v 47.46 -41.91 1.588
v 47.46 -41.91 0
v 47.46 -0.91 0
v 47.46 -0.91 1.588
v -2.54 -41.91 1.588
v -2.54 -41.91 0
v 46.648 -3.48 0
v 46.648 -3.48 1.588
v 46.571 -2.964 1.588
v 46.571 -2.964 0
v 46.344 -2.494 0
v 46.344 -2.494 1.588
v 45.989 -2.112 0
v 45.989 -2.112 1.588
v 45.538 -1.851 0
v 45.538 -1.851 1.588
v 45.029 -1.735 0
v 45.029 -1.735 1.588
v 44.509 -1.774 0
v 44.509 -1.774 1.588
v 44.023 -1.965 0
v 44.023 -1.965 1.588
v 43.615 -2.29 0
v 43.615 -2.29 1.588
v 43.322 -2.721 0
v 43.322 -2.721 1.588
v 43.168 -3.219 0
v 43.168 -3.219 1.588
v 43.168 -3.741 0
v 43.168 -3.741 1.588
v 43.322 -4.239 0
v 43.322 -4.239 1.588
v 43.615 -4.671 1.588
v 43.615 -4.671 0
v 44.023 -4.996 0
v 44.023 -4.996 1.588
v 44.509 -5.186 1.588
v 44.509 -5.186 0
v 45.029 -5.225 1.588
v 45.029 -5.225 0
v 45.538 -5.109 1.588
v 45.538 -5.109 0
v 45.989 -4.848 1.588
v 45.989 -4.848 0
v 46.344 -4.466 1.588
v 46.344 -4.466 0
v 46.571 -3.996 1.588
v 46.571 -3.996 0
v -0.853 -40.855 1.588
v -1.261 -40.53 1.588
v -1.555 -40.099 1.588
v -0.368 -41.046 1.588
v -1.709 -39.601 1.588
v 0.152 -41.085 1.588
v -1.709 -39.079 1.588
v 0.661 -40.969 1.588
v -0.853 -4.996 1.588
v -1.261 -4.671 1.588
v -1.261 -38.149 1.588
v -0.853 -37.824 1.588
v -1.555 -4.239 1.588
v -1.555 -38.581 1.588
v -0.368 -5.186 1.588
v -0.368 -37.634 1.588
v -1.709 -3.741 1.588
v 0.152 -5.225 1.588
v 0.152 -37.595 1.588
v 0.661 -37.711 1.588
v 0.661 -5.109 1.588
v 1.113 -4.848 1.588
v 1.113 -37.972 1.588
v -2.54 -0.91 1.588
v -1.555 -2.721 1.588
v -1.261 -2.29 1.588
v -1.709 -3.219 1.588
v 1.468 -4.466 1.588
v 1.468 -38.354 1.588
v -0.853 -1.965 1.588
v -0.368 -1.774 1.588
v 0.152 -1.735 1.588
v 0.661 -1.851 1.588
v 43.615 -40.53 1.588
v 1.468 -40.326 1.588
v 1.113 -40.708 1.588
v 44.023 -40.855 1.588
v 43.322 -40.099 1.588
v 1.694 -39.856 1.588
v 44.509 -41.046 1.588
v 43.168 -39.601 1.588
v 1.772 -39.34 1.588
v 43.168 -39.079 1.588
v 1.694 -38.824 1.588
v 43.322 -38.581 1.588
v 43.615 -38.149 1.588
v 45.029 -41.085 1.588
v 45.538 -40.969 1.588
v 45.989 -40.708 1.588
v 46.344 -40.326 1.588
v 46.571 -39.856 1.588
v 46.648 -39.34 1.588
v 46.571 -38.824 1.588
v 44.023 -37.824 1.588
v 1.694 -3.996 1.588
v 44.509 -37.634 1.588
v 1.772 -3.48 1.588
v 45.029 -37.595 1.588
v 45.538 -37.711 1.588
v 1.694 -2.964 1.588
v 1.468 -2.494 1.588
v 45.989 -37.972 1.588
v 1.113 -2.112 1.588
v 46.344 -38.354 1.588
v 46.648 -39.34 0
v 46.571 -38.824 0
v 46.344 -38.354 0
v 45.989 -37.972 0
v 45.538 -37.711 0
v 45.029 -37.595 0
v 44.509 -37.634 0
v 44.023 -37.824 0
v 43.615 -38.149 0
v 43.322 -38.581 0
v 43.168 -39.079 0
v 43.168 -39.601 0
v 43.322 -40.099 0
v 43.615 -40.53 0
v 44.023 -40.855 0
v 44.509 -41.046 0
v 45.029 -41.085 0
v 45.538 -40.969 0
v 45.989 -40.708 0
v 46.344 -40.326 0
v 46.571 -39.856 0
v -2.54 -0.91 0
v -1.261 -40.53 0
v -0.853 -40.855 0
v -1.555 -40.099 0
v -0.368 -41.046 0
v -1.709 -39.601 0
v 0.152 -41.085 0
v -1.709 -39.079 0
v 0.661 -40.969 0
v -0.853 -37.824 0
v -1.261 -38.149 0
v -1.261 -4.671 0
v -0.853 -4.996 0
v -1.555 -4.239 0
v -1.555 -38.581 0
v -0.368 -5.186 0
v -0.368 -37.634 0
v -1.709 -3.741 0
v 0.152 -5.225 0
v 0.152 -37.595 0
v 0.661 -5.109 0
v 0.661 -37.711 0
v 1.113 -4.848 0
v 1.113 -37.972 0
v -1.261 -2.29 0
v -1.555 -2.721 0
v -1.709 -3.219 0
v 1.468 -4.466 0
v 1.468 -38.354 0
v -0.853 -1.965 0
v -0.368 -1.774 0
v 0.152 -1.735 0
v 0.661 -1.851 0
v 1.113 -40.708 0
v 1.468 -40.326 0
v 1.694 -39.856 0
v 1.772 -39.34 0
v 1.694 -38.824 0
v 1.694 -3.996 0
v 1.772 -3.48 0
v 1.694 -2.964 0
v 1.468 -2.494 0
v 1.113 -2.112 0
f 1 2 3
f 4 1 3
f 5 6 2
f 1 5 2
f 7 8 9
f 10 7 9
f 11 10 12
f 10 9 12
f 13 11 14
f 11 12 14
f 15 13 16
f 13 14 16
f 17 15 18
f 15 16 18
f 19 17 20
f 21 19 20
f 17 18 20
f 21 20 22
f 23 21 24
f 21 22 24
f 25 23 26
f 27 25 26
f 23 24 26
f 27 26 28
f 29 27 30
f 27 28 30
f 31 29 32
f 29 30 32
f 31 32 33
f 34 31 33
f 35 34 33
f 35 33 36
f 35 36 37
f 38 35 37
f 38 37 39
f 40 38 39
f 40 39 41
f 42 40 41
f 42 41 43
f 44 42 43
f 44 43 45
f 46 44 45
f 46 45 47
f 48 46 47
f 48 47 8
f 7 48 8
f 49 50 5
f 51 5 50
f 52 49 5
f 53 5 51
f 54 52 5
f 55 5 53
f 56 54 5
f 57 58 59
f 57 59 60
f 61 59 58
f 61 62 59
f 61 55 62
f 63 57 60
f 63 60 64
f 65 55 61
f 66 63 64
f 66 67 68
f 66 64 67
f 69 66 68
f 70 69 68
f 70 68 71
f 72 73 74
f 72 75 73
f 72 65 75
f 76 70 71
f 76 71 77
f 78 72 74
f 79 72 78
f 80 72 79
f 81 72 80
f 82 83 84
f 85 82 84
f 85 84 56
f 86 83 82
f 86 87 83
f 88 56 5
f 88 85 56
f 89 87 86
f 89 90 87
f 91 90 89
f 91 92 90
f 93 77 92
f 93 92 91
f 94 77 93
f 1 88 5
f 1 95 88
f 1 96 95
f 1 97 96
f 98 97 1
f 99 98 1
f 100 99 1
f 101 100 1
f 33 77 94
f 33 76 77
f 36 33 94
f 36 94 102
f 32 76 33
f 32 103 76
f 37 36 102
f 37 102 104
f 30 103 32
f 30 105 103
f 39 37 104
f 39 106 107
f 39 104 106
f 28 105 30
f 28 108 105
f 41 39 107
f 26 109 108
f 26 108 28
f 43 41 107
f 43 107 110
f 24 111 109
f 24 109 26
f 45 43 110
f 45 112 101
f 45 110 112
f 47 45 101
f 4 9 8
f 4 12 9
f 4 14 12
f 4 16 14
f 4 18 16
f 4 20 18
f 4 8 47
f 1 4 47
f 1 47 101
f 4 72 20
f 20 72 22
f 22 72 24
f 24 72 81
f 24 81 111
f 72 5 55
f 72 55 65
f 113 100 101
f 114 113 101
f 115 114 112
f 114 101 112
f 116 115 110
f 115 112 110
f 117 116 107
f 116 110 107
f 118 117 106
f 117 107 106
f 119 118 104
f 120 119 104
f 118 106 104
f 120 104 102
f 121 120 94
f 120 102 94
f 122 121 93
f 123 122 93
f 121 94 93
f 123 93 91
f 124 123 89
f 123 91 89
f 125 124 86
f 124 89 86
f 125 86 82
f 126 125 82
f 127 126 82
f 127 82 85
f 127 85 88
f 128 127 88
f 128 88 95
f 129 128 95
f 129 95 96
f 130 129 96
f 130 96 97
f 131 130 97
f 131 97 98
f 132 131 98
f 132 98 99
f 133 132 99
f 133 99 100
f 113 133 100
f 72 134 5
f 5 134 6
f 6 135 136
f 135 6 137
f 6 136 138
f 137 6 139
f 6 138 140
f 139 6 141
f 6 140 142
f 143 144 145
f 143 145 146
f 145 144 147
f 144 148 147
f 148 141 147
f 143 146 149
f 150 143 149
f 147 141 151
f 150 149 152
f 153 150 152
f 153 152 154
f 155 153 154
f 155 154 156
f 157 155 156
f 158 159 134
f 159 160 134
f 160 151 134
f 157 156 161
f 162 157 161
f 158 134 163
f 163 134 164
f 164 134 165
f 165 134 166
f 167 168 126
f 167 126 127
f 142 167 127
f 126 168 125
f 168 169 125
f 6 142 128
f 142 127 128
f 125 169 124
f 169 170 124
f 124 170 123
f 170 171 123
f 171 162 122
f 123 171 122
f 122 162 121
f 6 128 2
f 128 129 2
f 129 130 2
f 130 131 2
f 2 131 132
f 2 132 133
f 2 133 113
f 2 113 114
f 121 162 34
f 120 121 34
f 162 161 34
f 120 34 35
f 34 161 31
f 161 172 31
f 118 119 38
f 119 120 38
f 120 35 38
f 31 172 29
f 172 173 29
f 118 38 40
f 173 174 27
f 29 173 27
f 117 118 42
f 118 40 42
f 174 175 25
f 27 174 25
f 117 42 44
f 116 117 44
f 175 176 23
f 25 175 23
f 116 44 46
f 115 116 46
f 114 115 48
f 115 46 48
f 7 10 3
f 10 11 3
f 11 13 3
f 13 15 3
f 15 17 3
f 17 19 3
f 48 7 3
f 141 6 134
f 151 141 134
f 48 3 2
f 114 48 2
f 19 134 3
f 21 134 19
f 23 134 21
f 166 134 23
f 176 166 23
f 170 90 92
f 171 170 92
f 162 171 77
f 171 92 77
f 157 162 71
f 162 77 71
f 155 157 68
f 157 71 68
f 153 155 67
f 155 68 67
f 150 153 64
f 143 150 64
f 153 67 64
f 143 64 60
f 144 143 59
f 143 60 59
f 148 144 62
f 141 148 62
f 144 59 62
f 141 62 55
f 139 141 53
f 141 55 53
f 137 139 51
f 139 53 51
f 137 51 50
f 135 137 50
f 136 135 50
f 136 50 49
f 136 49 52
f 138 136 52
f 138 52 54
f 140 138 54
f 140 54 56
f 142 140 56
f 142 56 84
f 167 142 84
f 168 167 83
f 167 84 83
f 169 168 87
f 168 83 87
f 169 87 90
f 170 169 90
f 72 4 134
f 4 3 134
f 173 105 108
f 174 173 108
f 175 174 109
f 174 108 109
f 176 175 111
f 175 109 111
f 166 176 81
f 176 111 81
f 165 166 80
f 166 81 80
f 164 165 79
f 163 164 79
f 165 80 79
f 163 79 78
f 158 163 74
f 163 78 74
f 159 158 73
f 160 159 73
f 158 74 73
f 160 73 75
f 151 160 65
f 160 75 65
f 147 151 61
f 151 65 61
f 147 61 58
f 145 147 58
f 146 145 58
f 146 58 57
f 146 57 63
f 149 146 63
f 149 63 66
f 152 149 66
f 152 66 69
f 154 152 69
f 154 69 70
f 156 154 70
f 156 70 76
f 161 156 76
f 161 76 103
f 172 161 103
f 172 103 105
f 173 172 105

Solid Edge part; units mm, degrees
sketch "Sketch1" plane through (0, 0, 0) normal (0, 0, 1) x (1, 0, 0)
  line L0 (-2.54, -0.91) -> (-2.54, -41.91)
  line L1 (-2.54, -41.91) -> (47.46, -41.91)
  line L2 (47.46, -41.91) -> (47.46, -0.91)
  line L3 (47.46, -0.91) -> (-2.54, -0.91)
extrude "Protrusion1" add sketch "Sketch1" along normal blind 1.5875
sketch "Sketch2" plane through (22.46, -21.41, 1.5875) normal (0, 0, 1) x (1, 0, 0)
  circle A0 centre (22.4383, 17.9298) radius 1.75
  circle A1 centre (22.4383, -17.9298) radius 1.75
  circle A2 centre (-22.4383, -17.9298) radius 1.75
  circle A3 centre (-22.4383, 17.9298) radius 1.75
  dimension "D1" = 3.5
  dimension "D2" = 41.3766
  dimension "D3" = 32.3596
extrude "ExtrudedCutout_1" cut sketch "Sketch2" against normal blind 33.274
